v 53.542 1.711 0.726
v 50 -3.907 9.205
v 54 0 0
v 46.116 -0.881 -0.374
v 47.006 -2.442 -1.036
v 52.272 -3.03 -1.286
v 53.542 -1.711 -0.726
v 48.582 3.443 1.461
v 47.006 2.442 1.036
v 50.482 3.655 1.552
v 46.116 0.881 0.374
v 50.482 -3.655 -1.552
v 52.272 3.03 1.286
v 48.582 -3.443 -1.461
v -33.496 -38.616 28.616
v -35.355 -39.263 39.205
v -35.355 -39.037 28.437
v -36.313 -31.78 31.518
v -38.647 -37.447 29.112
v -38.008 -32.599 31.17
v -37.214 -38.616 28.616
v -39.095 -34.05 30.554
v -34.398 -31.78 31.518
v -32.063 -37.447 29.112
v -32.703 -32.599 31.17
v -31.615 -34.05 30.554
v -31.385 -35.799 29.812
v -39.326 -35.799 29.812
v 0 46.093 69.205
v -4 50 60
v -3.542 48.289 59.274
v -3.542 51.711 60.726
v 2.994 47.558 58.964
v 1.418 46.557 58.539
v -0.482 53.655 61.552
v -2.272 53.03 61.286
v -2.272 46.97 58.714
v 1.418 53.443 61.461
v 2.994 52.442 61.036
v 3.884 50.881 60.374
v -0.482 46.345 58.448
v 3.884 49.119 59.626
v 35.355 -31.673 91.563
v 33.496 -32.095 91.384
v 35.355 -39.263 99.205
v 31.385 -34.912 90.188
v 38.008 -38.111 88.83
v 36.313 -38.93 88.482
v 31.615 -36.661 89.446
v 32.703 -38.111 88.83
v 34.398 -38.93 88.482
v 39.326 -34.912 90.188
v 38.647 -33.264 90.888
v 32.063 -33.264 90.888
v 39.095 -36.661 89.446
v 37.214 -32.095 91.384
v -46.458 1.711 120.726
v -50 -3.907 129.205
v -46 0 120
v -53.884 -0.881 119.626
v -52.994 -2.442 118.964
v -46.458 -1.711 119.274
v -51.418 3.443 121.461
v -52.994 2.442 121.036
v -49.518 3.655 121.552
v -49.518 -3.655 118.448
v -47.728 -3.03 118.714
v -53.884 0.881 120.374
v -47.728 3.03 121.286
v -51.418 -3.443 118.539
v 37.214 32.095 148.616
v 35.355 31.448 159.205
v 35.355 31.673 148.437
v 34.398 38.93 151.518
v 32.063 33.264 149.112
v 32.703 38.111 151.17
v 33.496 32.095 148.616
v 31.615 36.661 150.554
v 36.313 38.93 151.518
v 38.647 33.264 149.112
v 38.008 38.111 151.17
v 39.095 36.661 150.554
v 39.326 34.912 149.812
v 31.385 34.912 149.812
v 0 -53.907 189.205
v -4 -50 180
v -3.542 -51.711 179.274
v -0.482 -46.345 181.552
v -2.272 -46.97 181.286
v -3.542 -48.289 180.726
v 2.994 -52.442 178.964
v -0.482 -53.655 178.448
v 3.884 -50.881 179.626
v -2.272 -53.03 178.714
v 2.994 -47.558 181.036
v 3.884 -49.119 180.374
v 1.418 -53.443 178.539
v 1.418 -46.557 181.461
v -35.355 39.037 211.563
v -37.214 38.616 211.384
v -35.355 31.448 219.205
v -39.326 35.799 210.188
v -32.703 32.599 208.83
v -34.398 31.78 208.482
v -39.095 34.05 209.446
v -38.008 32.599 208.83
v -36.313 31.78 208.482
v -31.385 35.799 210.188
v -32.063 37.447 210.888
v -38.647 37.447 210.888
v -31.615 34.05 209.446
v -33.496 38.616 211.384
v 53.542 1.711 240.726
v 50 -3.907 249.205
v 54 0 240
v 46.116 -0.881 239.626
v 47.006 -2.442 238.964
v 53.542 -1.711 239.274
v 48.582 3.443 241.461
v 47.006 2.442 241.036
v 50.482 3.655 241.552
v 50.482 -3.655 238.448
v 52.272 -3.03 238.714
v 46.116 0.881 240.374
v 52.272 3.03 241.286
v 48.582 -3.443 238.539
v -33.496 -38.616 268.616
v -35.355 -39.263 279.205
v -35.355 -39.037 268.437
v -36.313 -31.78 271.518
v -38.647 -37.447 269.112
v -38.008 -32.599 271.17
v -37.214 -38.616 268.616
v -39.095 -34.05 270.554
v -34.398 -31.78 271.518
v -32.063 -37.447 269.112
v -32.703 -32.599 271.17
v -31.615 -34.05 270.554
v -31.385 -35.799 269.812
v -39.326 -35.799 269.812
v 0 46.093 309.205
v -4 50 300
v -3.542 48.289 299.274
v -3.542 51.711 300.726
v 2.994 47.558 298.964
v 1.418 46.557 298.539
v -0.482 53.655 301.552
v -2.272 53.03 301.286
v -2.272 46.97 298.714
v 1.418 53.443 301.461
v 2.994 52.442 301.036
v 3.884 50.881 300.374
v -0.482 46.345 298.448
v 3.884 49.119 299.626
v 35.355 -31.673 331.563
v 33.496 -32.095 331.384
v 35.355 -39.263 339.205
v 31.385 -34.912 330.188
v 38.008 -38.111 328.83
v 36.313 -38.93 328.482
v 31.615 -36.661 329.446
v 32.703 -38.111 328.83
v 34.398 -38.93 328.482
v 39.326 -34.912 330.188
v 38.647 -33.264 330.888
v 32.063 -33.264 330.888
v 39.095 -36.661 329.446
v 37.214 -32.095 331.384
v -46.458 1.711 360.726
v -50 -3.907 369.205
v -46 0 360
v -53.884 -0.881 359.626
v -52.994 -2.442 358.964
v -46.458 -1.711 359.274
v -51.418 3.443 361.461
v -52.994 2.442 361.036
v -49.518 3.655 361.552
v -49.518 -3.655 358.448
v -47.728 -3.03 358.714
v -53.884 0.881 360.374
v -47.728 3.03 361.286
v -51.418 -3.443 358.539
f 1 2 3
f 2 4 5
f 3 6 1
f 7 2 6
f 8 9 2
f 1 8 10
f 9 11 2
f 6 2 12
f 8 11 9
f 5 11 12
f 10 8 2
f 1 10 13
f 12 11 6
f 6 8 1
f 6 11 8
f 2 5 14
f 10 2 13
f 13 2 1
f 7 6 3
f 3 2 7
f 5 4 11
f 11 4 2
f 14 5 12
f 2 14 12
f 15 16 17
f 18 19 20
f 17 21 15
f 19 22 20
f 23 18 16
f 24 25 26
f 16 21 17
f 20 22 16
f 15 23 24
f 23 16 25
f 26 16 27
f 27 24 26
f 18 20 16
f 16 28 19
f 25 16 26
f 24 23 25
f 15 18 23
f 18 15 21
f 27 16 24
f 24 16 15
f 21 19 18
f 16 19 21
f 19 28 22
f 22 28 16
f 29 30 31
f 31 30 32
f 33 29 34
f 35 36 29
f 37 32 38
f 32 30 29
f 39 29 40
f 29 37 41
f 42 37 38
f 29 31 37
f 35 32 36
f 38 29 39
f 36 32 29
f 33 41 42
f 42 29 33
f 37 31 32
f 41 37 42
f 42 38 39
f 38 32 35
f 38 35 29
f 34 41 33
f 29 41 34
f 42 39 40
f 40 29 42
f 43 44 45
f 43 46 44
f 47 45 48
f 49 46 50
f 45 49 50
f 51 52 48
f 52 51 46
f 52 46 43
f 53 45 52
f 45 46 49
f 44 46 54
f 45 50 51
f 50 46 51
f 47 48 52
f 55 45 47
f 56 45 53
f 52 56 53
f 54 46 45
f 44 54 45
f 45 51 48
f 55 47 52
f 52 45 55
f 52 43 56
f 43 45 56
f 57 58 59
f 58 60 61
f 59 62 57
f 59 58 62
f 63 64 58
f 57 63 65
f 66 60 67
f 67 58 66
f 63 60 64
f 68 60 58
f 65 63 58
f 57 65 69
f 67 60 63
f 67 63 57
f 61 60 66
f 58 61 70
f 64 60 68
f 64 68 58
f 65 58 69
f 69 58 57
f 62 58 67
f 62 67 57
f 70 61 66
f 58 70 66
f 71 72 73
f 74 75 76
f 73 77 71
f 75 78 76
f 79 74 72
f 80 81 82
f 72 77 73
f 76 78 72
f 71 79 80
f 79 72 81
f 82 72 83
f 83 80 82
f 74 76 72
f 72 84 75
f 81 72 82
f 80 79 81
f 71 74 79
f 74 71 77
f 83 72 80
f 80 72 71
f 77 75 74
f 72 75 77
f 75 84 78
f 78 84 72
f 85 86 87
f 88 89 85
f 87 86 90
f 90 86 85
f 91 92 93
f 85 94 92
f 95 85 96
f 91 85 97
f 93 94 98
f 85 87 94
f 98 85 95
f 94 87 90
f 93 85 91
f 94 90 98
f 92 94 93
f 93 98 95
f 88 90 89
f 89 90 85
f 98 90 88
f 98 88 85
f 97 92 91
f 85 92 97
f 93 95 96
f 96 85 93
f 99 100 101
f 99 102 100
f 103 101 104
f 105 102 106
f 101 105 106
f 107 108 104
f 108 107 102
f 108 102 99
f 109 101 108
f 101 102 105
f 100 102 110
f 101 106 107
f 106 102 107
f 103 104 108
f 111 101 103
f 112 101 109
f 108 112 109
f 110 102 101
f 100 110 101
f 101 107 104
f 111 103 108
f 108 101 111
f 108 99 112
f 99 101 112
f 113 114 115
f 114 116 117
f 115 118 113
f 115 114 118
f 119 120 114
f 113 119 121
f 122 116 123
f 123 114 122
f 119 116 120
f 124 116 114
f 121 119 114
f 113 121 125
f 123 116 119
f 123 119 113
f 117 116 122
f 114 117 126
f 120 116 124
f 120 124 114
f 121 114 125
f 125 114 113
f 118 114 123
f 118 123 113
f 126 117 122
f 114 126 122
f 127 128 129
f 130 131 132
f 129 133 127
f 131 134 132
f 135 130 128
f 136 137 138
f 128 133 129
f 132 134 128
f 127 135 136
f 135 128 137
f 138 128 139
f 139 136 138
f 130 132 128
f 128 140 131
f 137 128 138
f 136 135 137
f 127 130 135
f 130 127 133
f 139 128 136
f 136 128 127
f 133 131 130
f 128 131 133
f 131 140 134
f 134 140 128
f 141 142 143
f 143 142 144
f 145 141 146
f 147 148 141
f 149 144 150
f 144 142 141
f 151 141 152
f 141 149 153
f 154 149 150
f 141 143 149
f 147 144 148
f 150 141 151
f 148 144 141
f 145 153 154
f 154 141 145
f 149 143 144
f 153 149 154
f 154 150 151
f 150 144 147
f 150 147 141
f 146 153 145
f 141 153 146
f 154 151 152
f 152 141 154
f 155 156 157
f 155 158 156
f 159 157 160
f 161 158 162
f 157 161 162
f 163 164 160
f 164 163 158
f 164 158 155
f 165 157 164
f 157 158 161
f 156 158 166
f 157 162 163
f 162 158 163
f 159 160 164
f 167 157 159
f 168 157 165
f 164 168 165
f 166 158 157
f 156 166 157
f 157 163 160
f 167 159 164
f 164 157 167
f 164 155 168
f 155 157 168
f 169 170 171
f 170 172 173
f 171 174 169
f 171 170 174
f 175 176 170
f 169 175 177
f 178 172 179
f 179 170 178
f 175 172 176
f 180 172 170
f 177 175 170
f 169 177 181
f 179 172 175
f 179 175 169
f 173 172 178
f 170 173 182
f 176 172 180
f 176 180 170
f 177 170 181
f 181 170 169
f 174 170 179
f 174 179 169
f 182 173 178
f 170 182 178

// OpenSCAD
// modulo para importar
// todavía no está listo
module huecos(){
z_step = 2;
r= 50;
vueltas= 2;
step = 15;
final = 360/vueltas;

for(i = [0:step:final]){
    translate([r*cos(step*i),r*sin(step*i),z_step*i])
    rotate([23,0,0])
    rotate([0,0,18*i])
    cylinder(h=10,r1=4,r2=0);
    }
}

huecos();
